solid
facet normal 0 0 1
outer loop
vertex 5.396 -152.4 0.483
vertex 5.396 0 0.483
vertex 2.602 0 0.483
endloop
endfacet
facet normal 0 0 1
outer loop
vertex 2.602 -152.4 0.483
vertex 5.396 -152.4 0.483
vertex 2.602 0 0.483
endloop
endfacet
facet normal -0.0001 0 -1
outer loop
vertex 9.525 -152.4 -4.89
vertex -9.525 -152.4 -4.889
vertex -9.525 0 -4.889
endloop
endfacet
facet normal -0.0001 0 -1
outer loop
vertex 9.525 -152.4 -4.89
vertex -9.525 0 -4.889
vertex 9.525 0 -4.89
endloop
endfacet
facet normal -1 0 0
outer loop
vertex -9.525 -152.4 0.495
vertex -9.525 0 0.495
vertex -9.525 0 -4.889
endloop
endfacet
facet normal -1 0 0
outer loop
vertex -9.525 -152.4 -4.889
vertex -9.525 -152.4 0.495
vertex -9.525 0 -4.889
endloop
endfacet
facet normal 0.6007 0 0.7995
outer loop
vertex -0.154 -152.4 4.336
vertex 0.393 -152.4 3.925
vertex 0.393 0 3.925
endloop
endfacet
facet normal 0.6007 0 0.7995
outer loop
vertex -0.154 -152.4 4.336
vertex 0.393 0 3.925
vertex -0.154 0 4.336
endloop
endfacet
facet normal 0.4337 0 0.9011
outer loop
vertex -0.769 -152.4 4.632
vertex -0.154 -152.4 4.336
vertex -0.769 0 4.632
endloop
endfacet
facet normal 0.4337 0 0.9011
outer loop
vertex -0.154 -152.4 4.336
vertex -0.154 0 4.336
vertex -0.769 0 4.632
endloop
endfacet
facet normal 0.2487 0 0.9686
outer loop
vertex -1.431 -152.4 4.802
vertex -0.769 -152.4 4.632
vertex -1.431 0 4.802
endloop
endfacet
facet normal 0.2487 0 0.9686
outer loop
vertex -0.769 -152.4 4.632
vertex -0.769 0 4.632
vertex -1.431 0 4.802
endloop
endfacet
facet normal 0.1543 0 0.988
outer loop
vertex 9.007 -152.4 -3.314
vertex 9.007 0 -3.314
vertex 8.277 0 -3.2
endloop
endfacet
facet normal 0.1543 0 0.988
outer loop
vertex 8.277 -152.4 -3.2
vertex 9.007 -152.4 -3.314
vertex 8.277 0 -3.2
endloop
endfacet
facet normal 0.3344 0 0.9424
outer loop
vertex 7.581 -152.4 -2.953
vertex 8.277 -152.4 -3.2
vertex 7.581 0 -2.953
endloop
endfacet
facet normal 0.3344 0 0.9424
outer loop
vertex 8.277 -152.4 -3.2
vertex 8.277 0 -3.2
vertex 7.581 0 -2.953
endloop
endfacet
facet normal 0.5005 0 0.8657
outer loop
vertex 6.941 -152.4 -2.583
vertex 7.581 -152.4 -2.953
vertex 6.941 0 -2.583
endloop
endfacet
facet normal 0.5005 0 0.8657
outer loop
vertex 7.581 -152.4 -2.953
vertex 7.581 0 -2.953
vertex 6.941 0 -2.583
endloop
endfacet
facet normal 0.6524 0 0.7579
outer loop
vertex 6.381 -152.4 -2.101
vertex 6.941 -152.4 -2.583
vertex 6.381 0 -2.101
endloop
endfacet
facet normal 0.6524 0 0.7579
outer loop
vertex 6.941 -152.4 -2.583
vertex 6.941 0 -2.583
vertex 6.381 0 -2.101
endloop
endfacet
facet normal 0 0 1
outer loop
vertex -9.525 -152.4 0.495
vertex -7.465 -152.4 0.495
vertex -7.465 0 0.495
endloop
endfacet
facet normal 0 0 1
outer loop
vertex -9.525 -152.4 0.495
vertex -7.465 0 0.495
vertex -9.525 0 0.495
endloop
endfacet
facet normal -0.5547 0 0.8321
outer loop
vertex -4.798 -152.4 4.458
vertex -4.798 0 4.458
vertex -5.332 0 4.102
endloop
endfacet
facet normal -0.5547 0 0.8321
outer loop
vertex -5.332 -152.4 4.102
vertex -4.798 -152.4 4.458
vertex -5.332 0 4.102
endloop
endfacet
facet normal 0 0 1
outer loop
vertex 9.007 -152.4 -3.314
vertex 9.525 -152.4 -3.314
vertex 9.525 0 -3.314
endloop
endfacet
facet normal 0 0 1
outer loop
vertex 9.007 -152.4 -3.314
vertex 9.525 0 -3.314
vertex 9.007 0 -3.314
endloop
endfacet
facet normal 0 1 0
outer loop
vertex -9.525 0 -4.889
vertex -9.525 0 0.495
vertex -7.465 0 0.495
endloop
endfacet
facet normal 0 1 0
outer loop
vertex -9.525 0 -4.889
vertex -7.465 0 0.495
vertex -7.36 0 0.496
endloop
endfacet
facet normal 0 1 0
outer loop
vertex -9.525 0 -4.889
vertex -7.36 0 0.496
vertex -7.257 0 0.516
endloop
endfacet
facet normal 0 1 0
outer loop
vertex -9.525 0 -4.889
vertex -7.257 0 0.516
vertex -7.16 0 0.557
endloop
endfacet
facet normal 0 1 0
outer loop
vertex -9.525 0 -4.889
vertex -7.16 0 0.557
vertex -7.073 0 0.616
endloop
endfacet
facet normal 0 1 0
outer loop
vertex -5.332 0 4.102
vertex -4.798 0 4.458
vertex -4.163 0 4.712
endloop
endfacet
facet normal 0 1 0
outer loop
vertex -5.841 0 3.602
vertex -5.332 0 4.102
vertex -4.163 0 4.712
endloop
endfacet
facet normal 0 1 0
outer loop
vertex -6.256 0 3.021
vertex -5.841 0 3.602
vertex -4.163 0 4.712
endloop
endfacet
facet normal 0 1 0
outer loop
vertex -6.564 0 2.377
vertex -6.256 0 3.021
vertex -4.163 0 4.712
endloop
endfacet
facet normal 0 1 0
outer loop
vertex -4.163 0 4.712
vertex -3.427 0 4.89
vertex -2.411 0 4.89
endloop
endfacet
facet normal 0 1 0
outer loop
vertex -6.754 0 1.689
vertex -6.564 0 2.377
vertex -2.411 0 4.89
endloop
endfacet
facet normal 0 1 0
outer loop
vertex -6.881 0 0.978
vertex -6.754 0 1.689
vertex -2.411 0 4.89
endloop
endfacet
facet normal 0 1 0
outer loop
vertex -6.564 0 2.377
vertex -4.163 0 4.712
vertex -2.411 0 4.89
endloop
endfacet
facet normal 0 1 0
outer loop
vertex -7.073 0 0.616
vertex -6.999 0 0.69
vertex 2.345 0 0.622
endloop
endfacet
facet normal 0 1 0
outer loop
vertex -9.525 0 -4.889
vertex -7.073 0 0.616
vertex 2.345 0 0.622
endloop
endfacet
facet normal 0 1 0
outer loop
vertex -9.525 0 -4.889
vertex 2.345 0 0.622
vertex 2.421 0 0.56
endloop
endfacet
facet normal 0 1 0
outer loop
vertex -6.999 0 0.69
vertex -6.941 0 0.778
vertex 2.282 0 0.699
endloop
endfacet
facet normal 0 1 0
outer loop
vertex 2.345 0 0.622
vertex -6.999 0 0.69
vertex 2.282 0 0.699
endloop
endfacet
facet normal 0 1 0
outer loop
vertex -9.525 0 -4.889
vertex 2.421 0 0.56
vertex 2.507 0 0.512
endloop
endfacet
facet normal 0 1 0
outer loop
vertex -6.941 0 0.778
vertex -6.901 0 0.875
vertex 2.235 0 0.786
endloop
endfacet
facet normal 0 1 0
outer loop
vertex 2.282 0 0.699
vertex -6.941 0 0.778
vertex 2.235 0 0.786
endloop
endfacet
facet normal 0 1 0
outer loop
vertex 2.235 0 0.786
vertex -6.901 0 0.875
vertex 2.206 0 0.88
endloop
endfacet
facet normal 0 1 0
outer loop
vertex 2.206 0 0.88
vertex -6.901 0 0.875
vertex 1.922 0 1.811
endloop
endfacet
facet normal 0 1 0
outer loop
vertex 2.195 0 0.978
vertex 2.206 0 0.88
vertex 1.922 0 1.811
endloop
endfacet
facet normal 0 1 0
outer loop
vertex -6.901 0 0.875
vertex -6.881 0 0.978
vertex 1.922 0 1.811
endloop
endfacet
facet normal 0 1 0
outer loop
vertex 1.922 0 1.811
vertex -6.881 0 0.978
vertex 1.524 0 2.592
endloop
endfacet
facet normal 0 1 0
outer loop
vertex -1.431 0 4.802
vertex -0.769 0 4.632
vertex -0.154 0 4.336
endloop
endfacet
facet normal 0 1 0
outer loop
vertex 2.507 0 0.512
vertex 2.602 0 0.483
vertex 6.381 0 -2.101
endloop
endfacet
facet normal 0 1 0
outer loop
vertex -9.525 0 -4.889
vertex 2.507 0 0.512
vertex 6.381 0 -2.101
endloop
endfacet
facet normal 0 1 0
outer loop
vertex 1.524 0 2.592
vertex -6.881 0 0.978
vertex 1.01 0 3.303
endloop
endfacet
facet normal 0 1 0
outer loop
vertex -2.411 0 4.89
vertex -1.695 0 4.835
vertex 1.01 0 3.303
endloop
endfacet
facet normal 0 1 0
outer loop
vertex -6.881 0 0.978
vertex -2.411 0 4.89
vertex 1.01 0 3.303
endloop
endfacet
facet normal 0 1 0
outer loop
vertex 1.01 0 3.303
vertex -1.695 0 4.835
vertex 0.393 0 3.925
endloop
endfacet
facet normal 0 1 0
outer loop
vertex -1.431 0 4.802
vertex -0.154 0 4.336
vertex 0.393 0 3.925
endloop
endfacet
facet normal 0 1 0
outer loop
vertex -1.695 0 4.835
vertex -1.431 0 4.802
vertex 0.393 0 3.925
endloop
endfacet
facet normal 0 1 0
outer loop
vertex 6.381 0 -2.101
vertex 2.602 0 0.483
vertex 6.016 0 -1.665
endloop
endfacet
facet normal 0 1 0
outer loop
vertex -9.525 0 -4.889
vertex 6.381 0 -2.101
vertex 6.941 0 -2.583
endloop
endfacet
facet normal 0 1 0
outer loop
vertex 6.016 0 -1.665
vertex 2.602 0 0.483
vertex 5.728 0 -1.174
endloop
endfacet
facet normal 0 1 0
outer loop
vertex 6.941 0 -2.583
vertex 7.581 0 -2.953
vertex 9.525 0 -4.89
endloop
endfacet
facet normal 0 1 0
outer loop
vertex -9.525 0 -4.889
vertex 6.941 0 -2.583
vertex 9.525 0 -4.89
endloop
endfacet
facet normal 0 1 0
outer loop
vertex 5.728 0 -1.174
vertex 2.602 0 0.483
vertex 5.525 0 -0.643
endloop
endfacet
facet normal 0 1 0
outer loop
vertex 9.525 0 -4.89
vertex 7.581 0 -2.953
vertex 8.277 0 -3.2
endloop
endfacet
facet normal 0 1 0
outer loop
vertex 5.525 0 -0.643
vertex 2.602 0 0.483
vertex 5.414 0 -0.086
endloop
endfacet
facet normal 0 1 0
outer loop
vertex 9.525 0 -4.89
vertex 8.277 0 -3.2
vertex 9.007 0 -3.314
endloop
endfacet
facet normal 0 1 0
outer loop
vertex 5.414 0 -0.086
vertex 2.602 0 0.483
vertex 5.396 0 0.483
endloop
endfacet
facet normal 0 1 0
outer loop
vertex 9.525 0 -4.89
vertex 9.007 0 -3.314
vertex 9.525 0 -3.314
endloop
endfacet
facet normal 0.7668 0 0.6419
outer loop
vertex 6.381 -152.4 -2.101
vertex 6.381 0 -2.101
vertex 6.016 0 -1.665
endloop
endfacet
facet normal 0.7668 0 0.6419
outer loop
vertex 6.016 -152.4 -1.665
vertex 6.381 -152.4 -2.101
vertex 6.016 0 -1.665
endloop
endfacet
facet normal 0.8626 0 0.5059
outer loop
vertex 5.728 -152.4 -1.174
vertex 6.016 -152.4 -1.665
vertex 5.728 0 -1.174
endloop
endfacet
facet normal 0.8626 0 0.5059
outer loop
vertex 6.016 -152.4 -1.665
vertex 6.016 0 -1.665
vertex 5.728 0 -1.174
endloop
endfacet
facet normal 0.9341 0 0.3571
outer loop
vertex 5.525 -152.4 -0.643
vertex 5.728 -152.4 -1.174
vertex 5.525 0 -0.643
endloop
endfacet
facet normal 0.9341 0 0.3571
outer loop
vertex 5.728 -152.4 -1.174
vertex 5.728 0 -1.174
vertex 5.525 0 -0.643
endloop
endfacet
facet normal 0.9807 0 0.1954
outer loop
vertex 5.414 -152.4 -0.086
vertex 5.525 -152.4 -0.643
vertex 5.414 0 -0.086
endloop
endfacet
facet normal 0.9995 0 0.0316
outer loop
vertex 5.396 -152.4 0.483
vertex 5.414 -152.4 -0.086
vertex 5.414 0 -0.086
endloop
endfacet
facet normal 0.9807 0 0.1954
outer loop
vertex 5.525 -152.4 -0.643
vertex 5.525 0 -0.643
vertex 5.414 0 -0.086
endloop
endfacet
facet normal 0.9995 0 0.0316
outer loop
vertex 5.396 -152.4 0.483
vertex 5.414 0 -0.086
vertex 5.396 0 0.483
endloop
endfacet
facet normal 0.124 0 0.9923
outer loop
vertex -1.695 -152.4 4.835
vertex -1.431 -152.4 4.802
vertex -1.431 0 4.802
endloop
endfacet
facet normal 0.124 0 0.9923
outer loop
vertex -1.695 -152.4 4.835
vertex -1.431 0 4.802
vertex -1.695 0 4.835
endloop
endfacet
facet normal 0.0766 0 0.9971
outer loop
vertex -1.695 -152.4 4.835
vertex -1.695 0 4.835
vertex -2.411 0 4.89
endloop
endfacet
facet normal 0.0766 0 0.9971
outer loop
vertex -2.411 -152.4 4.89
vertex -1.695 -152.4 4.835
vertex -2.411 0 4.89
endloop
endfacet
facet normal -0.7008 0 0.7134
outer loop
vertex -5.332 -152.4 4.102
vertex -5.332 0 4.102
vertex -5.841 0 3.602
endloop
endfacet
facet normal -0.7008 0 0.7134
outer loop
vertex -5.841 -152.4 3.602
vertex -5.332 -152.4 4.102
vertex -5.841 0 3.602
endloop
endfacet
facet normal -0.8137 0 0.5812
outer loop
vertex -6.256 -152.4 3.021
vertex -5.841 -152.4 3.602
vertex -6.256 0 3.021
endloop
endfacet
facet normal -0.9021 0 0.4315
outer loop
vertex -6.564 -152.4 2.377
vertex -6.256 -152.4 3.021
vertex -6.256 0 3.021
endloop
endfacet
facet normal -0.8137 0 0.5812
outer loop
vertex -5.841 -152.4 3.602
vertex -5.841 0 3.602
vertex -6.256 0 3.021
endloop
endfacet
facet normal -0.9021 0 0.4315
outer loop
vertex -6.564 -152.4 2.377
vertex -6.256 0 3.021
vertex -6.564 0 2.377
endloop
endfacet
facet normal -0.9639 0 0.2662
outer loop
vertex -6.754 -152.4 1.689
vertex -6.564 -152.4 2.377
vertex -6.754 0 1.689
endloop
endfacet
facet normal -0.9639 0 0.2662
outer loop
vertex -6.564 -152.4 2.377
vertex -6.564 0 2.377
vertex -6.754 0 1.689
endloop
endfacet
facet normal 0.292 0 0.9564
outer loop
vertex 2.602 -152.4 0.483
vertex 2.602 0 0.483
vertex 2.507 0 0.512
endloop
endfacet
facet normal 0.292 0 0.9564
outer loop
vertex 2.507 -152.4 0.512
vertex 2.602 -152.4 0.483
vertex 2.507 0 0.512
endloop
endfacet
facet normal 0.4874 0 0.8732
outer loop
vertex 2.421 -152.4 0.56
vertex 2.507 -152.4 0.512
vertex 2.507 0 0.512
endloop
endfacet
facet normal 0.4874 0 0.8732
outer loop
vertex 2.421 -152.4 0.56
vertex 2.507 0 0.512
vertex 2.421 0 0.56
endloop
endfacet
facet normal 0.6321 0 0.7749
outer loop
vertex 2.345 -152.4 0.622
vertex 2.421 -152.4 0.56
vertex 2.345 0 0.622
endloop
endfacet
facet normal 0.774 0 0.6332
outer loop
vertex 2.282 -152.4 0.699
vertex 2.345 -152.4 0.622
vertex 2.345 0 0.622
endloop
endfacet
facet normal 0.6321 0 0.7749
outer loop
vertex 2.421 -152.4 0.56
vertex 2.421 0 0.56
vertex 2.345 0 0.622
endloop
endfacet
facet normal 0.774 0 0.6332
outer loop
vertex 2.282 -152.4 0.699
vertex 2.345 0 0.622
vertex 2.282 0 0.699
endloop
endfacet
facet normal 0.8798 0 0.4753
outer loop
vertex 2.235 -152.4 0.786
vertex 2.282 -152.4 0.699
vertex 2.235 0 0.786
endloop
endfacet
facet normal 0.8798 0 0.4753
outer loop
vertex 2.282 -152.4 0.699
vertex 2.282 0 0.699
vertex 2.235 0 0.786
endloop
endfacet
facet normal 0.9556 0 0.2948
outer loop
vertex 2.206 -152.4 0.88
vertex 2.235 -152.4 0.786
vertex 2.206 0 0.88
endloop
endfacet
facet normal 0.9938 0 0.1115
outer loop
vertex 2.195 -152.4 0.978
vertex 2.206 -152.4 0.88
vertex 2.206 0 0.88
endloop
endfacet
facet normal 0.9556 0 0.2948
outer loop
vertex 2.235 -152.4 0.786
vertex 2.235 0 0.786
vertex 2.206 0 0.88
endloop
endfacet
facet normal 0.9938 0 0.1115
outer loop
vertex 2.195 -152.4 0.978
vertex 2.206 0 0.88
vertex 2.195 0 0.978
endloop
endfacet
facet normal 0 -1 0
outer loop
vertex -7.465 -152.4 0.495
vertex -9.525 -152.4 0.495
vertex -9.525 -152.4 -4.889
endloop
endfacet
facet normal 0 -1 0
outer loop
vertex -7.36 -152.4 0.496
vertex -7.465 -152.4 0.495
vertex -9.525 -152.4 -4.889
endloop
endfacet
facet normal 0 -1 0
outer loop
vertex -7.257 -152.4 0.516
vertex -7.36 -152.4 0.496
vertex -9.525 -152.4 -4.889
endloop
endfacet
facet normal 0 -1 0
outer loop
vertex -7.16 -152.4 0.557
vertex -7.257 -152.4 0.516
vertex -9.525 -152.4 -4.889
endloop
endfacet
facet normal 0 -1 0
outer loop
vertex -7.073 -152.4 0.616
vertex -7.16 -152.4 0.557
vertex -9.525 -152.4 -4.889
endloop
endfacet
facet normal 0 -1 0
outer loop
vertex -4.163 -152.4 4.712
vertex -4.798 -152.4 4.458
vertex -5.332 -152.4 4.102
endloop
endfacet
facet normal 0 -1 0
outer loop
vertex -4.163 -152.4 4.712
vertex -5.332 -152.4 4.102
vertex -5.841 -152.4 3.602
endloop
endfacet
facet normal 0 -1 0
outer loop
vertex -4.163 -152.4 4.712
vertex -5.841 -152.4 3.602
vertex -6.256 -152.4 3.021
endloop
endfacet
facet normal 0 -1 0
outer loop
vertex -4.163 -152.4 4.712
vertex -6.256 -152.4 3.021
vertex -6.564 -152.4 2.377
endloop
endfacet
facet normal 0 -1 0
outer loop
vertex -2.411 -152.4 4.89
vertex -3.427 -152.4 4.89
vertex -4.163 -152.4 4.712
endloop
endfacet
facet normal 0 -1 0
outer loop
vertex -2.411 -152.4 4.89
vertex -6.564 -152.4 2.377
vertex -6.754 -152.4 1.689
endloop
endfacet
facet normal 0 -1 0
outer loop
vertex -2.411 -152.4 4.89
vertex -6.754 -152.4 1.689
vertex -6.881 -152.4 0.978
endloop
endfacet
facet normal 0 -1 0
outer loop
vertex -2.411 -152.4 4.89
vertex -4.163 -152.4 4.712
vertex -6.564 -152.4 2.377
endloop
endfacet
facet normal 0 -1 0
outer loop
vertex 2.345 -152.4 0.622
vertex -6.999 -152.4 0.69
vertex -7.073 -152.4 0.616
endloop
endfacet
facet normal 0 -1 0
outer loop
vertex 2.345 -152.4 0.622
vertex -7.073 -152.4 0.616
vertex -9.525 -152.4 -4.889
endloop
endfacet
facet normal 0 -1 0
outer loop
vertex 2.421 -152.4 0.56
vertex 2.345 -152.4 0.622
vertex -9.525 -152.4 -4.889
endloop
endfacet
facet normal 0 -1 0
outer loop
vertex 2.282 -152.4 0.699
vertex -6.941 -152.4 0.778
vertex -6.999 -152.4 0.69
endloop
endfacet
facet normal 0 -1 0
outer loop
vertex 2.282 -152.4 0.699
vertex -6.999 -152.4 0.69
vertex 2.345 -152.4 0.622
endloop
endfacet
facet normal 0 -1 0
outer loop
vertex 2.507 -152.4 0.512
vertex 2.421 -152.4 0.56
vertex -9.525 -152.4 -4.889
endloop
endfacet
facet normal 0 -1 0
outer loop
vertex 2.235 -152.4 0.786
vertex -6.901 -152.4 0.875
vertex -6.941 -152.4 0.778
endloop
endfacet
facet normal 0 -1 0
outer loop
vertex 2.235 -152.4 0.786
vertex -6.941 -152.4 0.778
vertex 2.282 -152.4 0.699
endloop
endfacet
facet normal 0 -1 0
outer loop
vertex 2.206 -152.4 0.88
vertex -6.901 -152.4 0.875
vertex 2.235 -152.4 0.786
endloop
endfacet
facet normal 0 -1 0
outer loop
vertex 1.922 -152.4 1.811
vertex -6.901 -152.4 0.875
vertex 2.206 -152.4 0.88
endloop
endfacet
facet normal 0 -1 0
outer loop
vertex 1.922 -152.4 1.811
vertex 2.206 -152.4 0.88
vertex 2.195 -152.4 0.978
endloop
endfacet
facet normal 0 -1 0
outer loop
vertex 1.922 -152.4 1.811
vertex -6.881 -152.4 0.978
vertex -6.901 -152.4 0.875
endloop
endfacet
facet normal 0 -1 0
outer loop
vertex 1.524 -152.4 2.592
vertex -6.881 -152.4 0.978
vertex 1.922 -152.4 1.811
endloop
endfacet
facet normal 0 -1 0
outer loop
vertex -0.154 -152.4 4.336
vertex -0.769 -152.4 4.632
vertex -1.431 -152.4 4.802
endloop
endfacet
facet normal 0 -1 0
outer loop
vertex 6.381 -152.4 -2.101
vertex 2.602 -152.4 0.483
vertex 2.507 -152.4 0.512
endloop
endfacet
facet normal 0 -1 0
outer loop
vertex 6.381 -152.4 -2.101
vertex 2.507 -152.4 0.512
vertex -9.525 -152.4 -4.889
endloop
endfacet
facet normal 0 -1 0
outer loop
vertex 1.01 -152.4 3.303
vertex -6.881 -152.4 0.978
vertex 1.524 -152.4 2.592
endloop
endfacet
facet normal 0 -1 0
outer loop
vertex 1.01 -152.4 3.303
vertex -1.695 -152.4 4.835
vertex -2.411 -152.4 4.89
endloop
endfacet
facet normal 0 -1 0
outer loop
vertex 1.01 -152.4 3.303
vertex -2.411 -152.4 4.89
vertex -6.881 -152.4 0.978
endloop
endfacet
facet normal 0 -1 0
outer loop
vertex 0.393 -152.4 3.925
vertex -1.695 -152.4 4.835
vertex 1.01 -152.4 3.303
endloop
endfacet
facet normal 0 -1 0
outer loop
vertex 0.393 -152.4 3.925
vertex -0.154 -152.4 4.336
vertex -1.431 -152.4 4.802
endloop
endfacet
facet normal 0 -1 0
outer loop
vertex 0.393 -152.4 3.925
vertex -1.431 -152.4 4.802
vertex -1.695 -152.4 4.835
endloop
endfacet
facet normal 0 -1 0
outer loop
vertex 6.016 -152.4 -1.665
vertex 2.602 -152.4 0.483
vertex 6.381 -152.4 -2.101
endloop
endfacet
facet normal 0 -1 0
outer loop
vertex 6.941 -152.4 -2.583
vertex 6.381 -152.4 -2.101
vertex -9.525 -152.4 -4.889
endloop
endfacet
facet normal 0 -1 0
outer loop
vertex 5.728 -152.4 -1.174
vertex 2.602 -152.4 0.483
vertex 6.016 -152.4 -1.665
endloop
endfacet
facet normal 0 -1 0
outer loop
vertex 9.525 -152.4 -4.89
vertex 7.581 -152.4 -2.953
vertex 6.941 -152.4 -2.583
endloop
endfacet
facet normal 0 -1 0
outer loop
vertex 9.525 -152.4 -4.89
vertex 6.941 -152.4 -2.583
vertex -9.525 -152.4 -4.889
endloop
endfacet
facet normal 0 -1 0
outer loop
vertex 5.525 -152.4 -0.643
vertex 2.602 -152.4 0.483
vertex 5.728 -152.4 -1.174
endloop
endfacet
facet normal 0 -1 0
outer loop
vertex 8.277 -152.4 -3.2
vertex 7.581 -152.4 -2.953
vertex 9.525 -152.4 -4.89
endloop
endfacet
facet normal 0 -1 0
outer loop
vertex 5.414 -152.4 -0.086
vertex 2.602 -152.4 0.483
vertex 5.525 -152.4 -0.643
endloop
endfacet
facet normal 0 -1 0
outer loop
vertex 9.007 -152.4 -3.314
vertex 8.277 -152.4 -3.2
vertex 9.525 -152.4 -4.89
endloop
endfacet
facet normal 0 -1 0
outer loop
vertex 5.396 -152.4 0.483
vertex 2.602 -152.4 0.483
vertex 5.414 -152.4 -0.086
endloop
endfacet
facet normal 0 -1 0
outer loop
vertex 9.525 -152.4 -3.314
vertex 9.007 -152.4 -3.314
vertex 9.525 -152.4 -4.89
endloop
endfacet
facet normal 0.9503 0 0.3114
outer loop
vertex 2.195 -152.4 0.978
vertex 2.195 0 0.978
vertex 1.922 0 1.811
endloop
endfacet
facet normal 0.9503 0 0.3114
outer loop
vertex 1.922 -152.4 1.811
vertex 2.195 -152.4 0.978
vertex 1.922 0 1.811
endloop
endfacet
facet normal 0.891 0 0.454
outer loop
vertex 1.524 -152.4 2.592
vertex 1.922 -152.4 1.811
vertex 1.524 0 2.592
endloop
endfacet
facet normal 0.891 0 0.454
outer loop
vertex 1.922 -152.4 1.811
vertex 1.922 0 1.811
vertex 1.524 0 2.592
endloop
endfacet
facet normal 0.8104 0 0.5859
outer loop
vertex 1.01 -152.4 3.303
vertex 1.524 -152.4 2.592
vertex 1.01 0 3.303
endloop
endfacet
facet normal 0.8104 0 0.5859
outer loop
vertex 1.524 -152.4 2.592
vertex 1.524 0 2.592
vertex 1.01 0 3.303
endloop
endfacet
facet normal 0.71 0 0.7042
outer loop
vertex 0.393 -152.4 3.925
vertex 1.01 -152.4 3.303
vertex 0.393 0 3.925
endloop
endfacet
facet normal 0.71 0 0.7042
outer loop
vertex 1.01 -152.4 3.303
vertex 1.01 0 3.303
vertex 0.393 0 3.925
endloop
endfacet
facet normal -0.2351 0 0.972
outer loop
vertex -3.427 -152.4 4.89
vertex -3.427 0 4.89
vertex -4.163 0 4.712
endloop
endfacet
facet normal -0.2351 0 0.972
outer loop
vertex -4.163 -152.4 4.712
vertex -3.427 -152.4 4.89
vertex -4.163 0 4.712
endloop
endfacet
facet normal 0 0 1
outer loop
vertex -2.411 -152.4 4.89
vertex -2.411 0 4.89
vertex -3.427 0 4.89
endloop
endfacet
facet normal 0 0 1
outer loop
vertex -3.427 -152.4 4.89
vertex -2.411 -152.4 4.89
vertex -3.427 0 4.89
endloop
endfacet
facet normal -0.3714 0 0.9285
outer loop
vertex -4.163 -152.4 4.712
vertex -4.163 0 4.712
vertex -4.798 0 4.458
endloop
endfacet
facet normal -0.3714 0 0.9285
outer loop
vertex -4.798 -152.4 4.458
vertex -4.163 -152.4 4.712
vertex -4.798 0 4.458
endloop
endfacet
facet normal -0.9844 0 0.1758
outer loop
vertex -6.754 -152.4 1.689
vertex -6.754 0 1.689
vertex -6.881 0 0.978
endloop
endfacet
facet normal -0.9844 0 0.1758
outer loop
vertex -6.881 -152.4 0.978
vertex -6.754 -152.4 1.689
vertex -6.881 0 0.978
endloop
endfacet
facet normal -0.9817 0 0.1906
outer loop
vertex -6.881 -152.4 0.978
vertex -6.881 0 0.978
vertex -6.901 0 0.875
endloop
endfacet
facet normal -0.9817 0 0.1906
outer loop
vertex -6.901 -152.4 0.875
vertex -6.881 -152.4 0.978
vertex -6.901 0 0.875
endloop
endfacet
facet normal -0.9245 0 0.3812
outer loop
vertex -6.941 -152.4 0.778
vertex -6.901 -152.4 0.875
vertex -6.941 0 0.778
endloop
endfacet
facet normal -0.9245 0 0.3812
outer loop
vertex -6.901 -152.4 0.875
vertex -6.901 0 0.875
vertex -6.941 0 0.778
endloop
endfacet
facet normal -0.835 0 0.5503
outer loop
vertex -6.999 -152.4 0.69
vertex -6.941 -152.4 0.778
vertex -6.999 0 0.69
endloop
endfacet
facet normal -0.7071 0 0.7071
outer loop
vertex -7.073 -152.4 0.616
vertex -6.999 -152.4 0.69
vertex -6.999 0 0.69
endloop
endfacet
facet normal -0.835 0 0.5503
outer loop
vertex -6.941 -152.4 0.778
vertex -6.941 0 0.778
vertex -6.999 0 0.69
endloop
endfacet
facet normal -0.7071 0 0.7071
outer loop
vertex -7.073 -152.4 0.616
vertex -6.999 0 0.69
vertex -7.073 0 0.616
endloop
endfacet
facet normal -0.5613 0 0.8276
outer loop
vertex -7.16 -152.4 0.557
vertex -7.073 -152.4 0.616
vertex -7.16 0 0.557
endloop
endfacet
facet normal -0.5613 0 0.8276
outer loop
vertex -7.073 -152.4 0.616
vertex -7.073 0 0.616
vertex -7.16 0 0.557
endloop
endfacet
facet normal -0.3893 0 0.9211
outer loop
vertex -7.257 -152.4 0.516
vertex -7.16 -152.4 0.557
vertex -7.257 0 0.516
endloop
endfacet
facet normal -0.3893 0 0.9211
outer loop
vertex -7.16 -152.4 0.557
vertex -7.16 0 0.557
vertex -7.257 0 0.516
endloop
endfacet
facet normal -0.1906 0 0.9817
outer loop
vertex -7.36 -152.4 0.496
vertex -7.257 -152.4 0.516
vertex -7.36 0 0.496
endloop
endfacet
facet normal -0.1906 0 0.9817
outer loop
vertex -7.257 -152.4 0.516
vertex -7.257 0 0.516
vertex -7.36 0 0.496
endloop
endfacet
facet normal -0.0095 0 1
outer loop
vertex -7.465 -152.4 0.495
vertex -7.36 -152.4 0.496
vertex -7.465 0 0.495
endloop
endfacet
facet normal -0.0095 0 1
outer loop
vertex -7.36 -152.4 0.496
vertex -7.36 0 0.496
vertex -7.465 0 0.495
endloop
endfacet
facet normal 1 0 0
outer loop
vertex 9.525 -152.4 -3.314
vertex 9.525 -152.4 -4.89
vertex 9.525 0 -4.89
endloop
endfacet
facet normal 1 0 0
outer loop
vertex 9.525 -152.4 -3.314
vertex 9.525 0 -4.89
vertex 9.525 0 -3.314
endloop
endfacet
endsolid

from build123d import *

# Parameters (mm, degrees)
F1_DEPTH = 152.4


# Not quite as in the source:
# - ends of sketch curves that miss each other by under 0.0002 mm in the source are joined


with BuildPart() as f1:
    # F0 (on Front) → F1 (new body)
    with BuildSketch(Plane.XZ):
        with BuildLine():
            Line((-9.525, 0.4953), (-9.525, -4.888738))
            Line((-9.525, -4.888738), (9.525, -4.8895))
            Line((9.525, -4.8895), (9.525, -3.3139888))
            Line((9.525, -3.3139888), (9.007348, -3.3139888))
            ThreePointArc((9.007348, -3.3139888), (7.5806290696, -2.9530541155), (6.3808590282, -2.1007851053))
            ThreePointArc((6.3808590282, -2.1007851053), (5.615744399, -0.9130091212), (5.3955415237, 0.4826001377))
            Line((5.3955415237, 0.4826001377), (2.6015442, 0.4826))
            ThreePointArc((2.6015442, 0.4826), (2.3116101055, 0.6590793559), (2.195162482, 0.9779044504))
            ThreePointArc((2.195162482, 0.9779044504), (1.5242441759, 2.5923195678), (0.3926111465, 3.92493888))
            ThreePointArc((0.3926111465, 3.92493888), (-0.4543047996, 4.4987348188), (-1.4312133596, 4.8023046334))
            Line((-1.4312133596, 4.8023046334), (-1.6949178252, 4.8349308979))
            Line((-1.6949178252, 4.8349308979), (-2.410714, 4.8895))
            Line((-2.410714, 4.8895), (-3.426714, 4.8895))
            Line((-3.426714, 4.8895), (-4.163314, 4.7117))
            Line((-4.163314, 4.7117), (-4.798314, 4.4577))
            Line((-4.798314, 4.4577), (-5.331714, 4.1021))
            ThreePointArc((-5.331714, 4.1021), (-6.256392611, 3.0214411434), (-6.7541092682, 1.6890991273))
            Line((-6.7541092682, 1.6890991273), (-6.881114, 0.9779))
            ThreePointArc((-6.881114, 0.9779), (-7.0732646412, 0.615608671), (-7.4653139443, 0.4953005843))
            Line((-7.4653139443, 0.4953005843), (-9.525, 0.4953))
        make_face()
    extrude(amount=F1_DEPTH)


solid = f1.part
